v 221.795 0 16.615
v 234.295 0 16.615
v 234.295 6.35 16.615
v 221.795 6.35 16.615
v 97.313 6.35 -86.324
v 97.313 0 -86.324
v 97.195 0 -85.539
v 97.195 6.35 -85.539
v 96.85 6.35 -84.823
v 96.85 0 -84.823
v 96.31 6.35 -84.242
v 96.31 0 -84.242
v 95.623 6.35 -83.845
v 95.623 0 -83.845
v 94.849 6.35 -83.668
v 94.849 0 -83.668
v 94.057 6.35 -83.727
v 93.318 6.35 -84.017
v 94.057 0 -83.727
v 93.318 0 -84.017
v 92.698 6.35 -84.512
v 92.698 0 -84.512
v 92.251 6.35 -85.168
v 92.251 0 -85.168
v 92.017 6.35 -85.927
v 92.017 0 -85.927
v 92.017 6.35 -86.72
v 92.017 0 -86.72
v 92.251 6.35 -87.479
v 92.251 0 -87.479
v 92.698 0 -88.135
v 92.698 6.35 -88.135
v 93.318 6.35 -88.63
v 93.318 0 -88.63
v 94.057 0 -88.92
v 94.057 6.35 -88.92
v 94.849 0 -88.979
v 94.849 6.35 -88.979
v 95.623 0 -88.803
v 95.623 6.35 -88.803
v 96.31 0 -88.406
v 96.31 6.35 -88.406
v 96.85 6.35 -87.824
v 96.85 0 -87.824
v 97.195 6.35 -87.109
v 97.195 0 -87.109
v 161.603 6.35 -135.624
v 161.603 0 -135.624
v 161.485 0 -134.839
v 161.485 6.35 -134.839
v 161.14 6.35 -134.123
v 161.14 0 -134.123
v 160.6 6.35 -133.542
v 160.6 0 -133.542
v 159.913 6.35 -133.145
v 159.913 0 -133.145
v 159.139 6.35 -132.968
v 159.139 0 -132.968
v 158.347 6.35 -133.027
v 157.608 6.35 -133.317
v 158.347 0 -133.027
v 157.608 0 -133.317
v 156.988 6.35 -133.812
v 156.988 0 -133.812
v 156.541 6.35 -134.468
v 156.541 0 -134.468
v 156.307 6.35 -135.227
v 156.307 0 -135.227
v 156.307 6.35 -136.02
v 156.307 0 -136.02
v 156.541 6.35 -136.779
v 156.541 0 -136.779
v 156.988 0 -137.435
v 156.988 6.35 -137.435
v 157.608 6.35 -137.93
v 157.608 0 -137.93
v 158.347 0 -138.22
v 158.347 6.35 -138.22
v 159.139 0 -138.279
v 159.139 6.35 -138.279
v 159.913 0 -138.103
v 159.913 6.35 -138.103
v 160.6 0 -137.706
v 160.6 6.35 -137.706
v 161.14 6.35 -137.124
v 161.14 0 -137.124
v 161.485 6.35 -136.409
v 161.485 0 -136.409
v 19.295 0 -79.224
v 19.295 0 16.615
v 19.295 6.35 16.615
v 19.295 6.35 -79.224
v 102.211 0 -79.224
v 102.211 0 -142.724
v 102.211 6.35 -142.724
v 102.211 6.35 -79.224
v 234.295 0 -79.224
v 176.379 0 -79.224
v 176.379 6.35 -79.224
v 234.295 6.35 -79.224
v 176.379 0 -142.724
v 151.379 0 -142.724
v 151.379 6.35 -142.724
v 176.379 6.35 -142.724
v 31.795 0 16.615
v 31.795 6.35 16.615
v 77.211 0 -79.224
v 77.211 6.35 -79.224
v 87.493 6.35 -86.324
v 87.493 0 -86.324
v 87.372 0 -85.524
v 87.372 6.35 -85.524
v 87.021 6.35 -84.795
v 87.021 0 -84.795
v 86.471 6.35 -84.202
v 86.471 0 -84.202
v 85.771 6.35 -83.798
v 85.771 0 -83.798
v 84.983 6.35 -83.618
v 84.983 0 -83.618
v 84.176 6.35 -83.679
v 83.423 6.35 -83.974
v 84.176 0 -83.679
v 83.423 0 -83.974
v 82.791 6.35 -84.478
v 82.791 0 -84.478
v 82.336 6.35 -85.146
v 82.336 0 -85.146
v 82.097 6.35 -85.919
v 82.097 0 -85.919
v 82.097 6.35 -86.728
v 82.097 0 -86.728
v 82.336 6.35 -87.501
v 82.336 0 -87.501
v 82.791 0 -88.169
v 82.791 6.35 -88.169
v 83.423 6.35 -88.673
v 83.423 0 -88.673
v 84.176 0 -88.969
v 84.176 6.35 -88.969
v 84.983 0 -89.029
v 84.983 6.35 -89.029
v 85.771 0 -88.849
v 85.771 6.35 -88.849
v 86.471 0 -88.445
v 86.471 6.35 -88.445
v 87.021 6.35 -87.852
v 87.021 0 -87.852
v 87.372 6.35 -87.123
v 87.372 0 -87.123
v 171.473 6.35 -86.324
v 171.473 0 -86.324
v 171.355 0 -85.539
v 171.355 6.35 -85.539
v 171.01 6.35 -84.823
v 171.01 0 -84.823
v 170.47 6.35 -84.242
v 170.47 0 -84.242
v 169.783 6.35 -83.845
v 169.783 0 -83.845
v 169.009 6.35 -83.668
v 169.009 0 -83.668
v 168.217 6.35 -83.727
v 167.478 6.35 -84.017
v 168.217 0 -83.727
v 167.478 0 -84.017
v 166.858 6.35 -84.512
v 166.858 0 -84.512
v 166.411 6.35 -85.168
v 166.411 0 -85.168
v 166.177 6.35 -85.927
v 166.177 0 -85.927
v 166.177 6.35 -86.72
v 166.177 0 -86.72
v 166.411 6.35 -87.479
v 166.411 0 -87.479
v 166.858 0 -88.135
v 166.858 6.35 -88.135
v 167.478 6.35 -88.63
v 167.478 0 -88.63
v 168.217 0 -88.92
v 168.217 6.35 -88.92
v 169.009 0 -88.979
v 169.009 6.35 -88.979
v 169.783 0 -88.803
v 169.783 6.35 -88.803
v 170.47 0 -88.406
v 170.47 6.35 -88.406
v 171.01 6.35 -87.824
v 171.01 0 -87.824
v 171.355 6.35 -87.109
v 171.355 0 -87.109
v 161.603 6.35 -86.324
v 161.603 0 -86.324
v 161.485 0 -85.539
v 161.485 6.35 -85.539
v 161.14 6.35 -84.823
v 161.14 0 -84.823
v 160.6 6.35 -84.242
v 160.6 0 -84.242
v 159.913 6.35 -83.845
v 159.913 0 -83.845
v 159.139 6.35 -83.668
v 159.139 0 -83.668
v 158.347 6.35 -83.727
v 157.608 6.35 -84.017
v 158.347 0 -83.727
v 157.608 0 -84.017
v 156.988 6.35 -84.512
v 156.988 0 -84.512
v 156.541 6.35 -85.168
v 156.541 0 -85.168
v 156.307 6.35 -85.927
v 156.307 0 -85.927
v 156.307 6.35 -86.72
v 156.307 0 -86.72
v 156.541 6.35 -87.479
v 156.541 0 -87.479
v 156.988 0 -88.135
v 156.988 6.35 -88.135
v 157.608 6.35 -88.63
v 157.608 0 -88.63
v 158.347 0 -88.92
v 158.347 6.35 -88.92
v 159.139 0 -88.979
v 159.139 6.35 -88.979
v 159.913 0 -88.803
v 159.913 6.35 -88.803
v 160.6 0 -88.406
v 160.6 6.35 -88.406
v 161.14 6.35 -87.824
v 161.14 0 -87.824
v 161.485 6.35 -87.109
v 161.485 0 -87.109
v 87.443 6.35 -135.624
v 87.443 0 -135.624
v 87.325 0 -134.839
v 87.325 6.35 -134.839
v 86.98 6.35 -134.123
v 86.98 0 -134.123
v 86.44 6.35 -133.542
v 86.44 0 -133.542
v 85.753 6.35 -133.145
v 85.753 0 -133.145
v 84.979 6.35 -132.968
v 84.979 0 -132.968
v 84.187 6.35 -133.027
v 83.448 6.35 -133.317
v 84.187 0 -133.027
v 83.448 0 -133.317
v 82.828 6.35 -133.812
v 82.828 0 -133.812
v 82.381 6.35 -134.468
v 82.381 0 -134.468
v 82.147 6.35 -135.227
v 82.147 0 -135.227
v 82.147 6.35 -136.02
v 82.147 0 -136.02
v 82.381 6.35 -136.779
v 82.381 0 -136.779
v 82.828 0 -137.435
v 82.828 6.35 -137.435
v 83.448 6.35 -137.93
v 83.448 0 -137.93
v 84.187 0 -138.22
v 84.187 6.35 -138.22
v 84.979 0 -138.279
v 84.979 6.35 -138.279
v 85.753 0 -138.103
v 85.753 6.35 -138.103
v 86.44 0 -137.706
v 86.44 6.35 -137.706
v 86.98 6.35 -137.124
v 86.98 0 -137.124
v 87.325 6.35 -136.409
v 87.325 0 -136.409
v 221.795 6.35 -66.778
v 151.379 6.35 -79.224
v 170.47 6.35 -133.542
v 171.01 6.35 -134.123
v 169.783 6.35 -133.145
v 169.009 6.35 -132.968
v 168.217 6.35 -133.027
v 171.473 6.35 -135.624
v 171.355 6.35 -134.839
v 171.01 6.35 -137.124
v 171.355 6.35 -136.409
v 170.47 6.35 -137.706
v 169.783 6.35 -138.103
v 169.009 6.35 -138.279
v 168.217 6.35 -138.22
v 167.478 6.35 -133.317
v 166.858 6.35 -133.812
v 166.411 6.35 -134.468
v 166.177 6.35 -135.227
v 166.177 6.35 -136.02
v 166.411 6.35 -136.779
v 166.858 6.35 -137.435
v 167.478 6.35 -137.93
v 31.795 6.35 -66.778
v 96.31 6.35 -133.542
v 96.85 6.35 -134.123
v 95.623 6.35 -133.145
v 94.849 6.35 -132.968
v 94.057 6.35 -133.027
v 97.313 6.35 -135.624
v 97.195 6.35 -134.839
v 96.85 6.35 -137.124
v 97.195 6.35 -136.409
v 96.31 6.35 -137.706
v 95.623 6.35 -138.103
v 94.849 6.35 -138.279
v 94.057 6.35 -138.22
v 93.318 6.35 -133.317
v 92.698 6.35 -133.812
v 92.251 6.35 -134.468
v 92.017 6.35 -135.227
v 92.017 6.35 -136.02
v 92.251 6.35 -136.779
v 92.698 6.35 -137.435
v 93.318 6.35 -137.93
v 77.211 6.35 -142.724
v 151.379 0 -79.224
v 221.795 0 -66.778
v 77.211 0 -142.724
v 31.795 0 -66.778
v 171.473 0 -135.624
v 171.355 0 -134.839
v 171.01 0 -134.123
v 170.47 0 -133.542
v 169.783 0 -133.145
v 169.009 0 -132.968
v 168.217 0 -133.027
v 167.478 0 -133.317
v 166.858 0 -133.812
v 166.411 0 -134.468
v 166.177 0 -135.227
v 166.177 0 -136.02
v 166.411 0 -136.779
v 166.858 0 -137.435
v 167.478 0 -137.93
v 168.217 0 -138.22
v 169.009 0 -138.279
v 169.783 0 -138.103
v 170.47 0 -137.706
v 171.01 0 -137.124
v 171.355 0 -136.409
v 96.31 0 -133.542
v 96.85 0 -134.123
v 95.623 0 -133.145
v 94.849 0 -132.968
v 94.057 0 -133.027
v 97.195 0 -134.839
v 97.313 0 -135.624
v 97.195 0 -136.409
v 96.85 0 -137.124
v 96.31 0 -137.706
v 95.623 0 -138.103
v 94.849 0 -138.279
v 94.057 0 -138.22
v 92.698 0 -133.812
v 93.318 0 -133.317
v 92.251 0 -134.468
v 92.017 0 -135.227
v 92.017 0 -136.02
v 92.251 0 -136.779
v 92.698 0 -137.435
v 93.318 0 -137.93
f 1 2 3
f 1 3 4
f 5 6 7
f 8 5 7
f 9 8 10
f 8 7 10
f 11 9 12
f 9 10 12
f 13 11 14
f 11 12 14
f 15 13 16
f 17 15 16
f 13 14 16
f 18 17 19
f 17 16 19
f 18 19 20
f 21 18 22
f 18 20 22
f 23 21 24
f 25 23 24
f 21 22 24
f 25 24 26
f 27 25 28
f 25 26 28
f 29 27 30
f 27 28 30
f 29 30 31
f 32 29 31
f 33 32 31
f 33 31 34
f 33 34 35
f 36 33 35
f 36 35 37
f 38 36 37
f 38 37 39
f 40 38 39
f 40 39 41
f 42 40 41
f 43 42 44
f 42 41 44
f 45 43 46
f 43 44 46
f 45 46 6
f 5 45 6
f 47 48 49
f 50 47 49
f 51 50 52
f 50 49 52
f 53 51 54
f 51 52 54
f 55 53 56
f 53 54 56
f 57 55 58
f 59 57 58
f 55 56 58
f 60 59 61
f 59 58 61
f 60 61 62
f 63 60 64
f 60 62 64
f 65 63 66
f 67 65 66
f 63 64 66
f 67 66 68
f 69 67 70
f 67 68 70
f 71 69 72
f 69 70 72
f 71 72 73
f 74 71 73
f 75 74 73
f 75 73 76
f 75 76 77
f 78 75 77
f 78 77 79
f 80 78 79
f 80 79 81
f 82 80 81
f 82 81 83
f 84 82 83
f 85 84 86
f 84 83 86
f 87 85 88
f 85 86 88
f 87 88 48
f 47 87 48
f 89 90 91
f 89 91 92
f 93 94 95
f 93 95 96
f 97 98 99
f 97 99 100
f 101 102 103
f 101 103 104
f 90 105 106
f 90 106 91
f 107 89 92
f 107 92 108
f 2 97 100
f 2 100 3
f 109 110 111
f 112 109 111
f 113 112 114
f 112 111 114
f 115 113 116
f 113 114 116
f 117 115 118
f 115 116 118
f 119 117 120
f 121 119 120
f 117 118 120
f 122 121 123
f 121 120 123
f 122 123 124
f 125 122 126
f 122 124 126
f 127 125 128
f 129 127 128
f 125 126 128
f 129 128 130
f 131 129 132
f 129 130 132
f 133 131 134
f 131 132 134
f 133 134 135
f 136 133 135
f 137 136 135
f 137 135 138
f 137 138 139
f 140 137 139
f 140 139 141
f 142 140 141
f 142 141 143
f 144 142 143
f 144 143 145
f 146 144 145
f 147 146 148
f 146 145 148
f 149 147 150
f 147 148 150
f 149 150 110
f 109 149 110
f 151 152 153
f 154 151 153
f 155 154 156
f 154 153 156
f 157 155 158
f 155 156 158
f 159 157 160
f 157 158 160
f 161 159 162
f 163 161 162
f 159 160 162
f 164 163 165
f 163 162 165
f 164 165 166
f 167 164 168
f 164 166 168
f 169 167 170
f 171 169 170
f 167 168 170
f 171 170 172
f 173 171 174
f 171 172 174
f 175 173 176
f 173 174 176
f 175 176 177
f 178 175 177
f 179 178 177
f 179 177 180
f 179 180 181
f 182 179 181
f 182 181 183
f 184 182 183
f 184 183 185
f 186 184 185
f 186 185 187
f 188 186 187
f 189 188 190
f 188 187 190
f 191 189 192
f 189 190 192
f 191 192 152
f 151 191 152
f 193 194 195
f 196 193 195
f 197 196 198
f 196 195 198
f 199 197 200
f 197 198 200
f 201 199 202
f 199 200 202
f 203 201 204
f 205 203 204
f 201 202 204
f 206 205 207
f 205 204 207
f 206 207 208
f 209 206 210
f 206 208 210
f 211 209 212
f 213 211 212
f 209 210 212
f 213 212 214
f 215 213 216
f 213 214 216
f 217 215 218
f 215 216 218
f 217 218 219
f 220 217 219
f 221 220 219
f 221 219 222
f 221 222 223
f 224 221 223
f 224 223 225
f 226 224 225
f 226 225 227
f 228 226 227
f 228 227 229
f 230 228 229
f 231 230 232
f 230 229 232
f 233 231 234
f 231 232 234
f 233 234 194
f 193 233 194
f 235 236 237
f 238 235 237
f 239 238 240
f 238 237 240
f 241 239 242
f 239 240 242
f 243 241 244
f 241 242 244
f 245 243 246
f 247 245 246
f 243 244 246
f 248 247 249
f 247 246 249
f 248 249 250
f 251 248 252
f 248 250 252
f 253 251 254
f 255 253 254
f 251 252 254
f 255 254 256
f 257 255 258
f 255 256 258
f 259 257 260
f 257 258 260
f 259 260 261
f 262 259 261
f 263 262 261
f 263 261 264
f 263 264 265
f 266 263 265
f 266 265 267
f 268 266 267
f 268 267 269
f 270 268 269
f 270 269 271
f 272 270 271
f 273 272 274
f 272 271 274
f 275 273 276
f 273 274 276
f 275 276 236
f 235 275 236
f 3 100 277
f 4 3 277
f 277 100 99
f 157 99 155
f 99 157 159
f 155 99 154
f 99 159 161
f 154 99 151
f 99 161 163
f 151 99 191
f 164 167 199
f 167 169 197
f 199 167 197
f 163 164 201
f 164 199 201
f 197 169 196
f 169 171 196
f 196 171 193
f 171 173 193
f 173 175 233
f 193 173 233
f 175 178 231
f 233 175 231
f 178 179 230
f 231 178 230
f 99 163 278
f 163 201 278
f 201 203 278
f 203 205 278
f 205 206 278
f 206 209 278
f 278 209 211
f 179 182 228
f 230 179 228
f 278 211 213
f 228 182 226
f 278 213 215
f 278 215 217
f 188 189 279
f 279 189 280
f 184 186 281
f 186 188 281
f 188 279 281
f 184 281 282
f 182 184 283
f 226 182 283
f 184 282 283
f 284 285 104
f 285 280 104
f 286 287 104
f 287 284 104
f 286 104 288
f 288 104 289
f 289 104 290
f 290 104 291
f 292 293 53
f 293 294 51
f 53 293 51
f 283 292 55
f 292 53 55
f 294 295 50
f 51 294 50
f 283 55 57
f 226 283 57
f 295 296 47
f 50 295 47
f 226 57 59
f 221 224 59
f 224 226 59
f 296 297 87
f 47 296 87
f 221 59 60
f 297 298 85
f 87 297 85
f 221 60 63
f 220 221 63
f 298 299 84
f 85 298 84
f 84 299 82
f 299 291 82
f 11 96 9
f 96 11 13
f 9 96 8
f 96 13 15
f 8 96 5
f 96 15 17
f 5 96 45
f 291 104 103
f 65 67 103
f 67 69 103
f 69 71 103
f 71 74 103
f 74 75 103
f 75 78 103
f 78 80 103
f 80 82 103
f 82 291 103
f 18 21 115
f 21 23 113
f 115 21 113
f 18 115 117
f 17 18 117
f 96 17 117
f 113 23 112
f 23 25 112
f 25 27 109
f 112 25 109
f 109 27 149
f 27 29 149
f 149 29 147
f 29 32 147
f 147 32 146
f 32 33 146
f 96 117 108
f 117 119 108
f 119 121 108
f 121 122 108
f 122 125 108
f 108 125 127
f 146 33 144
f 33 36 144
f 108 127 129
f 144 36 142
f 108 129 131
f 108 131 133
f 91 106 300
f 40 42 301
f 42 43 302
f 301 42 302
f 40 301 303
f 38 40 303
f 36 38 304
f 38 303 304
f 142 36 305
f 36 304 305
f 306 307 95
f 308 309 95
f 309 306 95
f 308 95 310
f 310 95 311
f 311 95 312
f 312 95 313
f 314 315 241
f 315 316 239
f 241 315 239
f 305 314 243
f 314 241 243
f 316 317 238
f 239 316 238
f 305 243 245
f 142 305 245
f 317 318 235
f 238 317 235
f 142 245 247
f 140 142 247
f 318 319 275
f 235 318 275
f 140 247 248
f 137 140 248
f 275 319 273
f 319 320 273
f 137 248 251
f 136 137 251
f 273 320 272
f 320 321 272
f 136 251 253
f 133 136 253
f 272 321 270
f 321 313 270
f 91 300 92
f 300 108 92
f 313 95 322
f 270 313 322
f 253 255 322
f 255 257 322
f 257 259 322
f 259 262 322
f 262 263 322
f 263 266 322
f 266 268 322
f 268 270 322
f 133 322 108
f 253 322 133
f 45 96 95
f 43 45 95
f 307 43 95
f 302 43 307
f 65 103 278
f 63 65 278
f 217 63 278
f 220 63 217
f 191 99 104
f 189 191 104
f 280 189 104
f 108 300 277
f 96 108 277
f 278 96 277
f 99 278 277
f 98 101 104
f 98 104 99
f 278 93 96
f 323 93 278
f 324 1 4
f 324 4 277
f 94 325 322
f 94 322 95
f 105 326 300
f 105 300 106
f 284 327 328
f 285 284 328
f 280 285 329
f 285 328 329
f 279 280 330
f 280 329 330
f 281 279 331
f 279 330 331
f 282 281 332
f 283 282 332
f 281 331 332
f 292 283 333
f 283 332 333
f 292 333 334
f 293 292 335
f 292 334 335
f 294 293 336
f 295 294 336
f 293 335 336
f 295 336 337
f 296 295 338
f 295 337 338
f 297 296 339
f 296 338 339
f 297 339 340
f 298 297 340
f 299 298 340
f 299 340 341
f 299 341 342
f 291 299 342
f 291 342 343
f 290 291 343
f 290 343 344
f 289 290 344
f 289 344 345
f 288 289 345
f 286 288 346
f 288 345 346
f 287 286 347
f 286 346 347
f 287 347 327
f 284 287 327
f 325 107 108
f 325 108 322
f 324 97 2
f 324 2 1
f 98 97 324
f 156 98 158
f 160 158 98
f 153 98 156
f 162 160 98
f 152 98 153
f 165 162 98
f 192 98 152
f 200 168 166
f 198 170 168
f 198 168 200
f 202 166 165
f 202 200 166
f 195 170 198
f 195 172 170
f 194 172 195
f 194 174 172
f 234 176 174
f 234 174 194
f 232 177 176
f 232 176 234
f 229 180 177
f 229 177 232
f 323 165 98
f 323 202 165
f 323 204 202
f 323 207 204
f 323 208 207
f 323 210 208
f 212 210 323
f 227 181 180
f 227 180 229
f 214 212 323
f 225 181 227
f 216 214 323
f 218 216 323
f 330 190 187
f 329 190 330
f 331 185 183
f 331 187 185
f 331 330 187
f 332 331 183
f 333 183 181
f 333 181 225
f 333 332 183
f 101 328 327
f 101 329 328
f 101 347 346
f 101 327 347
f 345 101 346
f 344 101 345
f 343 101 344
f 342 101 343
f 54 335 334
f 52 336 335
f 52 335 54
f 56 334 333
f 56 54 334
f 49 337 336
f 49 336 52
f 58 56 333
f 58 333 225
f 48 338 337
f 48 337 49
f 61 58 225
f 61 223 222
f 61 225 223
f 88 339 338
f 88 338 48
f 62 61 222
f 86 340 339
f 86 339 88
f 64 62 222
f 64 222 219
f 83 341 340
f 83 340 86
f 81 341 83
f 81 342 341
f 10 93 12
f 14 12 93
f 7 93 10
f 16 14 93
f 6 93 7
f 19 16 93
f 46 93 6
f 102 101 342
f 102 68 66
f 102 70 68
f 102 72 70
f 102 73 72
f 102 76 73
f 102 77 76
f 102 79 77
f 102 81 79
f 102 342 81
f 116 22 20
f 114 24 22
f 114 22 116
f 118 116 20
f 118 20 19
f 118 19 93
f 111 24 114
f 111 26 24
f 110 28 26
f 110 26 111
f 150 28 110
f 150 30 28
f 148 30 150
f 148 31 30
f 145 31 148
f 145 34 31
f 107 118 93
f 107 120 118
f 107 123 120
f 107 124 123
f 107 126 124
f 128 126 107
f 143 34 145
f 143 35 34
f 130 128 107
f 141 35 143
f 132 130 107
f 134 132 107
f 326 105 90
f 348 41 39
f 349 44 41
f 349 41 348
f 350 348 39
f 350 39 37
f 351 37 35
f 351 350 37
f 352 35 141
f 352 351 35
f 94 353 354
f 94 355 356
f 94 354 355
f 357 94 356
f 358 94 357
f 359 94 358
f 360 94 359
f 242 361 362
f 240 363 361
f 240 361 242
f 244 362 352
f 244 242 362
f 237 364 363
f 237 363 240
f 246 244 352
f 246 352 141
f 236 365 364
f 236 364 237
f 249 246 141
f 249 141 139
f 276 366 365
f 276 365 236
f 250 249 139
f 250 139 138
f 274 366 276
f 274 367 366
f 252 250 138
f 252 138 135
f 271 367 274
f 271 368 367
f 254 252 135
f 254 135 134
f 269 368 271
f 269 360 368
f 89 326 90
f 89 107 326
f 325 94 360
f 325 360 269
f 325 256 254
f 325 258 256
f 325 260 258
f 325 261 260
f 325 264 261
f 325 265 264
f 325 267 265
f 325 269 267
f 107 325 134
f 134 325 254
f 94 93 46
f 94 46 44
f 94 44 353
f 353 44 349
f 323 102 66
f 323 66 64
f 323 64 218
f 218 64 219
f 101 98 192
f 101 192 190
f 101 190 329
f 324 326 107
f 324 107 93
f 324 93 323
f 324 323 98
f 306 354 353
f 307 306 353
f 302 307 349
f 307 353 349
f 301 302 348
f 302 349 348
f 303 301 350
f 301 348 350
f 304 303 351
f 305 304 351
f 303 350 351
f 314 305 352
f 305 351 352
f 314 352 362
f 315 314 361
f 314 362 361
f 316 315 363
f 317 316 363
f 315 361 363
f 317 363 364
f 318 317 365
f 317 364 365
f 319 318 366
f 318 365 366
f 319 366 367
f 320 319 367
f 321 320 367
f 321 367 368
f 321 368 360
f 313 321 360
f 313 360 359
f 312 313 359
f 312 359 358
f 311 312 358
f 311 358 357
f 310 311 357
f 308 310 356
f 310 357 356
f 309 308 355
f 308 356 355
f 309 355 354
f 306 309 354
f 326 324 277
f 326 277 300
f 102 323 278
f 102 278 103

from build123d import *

# Parameters (mm, degrees)
BOSS_EXTRUDE1_DEPTH = 6.35
SKETCH3_R           = 2.713000027
SKETCH3_R_2         = 2.663
CUT_EXTRUDE1_DEPTH  = 6.35


with BuildPart() as part:
    # Sketch1 → Boss-Extrude1 (new body)
    with BuildSketch(Plane(origin=(0, 0, 0), x_dir=(1, 0, 0), z_dir=(0, 1, 0))):
        Polygon((19.294897536, -16.615040594), (19.294897536, 79.223583745), (77.210897536, 79.223583745), (77.210897536, 142.723583745), (102.210897536, 142.723583745), (102.210897536, 79.223583745), (151.378897536, 79.223583745), (151.378897536, 142.723583745), (176.378897536, 142.723583745), (176.378897536, 79.223583745), (234.294897536, 79.223583745), (234.294897536, -16.615040594), (221.794897536, -16.615040594), (221.794897536, 66.777583745), (31.794897536, 66.777583745), (31.794897536, -16.615040594), align=None)
    extrude(amount=BOSS_EXTRUDE1_DEPTH)

    # Sketch3 → Cut-Extrude1 (cut)
    with BuildSketch(Plane.XZ):
        with Locations((84.779897535, -86.323583745)):
            Circle(SKETCH3_R)
        with Locations((94.649897535, -86.323583745)):
            Circle(SKETCH3_R_2)
        with Locations((84.779897535, -135.623583745)):
            Circle(SKETCH3_R_2)
        with Locations((94.649897535, -135.623583745)):
            Circle(SKETCH3_R_2)
        with Locations((158.939897536, -86.323583745)):
            Circle(SKETCH3_R_2)
        with Locations((168.809897536, -86.323583745)):
            Circle(SKETCH3_R_2)
        with Locations((158.939897536, -135.623583745)):
            Circle(SKETCH3_R_2)
        with Locations((168.809897536, -135.623583745)):
            Circle(SKETCH3_R_2)
    extrude(amount=-CUT_EXTRUDE1_DEPTH, mode=Mode.SUBTRACT)


solid = part.part
